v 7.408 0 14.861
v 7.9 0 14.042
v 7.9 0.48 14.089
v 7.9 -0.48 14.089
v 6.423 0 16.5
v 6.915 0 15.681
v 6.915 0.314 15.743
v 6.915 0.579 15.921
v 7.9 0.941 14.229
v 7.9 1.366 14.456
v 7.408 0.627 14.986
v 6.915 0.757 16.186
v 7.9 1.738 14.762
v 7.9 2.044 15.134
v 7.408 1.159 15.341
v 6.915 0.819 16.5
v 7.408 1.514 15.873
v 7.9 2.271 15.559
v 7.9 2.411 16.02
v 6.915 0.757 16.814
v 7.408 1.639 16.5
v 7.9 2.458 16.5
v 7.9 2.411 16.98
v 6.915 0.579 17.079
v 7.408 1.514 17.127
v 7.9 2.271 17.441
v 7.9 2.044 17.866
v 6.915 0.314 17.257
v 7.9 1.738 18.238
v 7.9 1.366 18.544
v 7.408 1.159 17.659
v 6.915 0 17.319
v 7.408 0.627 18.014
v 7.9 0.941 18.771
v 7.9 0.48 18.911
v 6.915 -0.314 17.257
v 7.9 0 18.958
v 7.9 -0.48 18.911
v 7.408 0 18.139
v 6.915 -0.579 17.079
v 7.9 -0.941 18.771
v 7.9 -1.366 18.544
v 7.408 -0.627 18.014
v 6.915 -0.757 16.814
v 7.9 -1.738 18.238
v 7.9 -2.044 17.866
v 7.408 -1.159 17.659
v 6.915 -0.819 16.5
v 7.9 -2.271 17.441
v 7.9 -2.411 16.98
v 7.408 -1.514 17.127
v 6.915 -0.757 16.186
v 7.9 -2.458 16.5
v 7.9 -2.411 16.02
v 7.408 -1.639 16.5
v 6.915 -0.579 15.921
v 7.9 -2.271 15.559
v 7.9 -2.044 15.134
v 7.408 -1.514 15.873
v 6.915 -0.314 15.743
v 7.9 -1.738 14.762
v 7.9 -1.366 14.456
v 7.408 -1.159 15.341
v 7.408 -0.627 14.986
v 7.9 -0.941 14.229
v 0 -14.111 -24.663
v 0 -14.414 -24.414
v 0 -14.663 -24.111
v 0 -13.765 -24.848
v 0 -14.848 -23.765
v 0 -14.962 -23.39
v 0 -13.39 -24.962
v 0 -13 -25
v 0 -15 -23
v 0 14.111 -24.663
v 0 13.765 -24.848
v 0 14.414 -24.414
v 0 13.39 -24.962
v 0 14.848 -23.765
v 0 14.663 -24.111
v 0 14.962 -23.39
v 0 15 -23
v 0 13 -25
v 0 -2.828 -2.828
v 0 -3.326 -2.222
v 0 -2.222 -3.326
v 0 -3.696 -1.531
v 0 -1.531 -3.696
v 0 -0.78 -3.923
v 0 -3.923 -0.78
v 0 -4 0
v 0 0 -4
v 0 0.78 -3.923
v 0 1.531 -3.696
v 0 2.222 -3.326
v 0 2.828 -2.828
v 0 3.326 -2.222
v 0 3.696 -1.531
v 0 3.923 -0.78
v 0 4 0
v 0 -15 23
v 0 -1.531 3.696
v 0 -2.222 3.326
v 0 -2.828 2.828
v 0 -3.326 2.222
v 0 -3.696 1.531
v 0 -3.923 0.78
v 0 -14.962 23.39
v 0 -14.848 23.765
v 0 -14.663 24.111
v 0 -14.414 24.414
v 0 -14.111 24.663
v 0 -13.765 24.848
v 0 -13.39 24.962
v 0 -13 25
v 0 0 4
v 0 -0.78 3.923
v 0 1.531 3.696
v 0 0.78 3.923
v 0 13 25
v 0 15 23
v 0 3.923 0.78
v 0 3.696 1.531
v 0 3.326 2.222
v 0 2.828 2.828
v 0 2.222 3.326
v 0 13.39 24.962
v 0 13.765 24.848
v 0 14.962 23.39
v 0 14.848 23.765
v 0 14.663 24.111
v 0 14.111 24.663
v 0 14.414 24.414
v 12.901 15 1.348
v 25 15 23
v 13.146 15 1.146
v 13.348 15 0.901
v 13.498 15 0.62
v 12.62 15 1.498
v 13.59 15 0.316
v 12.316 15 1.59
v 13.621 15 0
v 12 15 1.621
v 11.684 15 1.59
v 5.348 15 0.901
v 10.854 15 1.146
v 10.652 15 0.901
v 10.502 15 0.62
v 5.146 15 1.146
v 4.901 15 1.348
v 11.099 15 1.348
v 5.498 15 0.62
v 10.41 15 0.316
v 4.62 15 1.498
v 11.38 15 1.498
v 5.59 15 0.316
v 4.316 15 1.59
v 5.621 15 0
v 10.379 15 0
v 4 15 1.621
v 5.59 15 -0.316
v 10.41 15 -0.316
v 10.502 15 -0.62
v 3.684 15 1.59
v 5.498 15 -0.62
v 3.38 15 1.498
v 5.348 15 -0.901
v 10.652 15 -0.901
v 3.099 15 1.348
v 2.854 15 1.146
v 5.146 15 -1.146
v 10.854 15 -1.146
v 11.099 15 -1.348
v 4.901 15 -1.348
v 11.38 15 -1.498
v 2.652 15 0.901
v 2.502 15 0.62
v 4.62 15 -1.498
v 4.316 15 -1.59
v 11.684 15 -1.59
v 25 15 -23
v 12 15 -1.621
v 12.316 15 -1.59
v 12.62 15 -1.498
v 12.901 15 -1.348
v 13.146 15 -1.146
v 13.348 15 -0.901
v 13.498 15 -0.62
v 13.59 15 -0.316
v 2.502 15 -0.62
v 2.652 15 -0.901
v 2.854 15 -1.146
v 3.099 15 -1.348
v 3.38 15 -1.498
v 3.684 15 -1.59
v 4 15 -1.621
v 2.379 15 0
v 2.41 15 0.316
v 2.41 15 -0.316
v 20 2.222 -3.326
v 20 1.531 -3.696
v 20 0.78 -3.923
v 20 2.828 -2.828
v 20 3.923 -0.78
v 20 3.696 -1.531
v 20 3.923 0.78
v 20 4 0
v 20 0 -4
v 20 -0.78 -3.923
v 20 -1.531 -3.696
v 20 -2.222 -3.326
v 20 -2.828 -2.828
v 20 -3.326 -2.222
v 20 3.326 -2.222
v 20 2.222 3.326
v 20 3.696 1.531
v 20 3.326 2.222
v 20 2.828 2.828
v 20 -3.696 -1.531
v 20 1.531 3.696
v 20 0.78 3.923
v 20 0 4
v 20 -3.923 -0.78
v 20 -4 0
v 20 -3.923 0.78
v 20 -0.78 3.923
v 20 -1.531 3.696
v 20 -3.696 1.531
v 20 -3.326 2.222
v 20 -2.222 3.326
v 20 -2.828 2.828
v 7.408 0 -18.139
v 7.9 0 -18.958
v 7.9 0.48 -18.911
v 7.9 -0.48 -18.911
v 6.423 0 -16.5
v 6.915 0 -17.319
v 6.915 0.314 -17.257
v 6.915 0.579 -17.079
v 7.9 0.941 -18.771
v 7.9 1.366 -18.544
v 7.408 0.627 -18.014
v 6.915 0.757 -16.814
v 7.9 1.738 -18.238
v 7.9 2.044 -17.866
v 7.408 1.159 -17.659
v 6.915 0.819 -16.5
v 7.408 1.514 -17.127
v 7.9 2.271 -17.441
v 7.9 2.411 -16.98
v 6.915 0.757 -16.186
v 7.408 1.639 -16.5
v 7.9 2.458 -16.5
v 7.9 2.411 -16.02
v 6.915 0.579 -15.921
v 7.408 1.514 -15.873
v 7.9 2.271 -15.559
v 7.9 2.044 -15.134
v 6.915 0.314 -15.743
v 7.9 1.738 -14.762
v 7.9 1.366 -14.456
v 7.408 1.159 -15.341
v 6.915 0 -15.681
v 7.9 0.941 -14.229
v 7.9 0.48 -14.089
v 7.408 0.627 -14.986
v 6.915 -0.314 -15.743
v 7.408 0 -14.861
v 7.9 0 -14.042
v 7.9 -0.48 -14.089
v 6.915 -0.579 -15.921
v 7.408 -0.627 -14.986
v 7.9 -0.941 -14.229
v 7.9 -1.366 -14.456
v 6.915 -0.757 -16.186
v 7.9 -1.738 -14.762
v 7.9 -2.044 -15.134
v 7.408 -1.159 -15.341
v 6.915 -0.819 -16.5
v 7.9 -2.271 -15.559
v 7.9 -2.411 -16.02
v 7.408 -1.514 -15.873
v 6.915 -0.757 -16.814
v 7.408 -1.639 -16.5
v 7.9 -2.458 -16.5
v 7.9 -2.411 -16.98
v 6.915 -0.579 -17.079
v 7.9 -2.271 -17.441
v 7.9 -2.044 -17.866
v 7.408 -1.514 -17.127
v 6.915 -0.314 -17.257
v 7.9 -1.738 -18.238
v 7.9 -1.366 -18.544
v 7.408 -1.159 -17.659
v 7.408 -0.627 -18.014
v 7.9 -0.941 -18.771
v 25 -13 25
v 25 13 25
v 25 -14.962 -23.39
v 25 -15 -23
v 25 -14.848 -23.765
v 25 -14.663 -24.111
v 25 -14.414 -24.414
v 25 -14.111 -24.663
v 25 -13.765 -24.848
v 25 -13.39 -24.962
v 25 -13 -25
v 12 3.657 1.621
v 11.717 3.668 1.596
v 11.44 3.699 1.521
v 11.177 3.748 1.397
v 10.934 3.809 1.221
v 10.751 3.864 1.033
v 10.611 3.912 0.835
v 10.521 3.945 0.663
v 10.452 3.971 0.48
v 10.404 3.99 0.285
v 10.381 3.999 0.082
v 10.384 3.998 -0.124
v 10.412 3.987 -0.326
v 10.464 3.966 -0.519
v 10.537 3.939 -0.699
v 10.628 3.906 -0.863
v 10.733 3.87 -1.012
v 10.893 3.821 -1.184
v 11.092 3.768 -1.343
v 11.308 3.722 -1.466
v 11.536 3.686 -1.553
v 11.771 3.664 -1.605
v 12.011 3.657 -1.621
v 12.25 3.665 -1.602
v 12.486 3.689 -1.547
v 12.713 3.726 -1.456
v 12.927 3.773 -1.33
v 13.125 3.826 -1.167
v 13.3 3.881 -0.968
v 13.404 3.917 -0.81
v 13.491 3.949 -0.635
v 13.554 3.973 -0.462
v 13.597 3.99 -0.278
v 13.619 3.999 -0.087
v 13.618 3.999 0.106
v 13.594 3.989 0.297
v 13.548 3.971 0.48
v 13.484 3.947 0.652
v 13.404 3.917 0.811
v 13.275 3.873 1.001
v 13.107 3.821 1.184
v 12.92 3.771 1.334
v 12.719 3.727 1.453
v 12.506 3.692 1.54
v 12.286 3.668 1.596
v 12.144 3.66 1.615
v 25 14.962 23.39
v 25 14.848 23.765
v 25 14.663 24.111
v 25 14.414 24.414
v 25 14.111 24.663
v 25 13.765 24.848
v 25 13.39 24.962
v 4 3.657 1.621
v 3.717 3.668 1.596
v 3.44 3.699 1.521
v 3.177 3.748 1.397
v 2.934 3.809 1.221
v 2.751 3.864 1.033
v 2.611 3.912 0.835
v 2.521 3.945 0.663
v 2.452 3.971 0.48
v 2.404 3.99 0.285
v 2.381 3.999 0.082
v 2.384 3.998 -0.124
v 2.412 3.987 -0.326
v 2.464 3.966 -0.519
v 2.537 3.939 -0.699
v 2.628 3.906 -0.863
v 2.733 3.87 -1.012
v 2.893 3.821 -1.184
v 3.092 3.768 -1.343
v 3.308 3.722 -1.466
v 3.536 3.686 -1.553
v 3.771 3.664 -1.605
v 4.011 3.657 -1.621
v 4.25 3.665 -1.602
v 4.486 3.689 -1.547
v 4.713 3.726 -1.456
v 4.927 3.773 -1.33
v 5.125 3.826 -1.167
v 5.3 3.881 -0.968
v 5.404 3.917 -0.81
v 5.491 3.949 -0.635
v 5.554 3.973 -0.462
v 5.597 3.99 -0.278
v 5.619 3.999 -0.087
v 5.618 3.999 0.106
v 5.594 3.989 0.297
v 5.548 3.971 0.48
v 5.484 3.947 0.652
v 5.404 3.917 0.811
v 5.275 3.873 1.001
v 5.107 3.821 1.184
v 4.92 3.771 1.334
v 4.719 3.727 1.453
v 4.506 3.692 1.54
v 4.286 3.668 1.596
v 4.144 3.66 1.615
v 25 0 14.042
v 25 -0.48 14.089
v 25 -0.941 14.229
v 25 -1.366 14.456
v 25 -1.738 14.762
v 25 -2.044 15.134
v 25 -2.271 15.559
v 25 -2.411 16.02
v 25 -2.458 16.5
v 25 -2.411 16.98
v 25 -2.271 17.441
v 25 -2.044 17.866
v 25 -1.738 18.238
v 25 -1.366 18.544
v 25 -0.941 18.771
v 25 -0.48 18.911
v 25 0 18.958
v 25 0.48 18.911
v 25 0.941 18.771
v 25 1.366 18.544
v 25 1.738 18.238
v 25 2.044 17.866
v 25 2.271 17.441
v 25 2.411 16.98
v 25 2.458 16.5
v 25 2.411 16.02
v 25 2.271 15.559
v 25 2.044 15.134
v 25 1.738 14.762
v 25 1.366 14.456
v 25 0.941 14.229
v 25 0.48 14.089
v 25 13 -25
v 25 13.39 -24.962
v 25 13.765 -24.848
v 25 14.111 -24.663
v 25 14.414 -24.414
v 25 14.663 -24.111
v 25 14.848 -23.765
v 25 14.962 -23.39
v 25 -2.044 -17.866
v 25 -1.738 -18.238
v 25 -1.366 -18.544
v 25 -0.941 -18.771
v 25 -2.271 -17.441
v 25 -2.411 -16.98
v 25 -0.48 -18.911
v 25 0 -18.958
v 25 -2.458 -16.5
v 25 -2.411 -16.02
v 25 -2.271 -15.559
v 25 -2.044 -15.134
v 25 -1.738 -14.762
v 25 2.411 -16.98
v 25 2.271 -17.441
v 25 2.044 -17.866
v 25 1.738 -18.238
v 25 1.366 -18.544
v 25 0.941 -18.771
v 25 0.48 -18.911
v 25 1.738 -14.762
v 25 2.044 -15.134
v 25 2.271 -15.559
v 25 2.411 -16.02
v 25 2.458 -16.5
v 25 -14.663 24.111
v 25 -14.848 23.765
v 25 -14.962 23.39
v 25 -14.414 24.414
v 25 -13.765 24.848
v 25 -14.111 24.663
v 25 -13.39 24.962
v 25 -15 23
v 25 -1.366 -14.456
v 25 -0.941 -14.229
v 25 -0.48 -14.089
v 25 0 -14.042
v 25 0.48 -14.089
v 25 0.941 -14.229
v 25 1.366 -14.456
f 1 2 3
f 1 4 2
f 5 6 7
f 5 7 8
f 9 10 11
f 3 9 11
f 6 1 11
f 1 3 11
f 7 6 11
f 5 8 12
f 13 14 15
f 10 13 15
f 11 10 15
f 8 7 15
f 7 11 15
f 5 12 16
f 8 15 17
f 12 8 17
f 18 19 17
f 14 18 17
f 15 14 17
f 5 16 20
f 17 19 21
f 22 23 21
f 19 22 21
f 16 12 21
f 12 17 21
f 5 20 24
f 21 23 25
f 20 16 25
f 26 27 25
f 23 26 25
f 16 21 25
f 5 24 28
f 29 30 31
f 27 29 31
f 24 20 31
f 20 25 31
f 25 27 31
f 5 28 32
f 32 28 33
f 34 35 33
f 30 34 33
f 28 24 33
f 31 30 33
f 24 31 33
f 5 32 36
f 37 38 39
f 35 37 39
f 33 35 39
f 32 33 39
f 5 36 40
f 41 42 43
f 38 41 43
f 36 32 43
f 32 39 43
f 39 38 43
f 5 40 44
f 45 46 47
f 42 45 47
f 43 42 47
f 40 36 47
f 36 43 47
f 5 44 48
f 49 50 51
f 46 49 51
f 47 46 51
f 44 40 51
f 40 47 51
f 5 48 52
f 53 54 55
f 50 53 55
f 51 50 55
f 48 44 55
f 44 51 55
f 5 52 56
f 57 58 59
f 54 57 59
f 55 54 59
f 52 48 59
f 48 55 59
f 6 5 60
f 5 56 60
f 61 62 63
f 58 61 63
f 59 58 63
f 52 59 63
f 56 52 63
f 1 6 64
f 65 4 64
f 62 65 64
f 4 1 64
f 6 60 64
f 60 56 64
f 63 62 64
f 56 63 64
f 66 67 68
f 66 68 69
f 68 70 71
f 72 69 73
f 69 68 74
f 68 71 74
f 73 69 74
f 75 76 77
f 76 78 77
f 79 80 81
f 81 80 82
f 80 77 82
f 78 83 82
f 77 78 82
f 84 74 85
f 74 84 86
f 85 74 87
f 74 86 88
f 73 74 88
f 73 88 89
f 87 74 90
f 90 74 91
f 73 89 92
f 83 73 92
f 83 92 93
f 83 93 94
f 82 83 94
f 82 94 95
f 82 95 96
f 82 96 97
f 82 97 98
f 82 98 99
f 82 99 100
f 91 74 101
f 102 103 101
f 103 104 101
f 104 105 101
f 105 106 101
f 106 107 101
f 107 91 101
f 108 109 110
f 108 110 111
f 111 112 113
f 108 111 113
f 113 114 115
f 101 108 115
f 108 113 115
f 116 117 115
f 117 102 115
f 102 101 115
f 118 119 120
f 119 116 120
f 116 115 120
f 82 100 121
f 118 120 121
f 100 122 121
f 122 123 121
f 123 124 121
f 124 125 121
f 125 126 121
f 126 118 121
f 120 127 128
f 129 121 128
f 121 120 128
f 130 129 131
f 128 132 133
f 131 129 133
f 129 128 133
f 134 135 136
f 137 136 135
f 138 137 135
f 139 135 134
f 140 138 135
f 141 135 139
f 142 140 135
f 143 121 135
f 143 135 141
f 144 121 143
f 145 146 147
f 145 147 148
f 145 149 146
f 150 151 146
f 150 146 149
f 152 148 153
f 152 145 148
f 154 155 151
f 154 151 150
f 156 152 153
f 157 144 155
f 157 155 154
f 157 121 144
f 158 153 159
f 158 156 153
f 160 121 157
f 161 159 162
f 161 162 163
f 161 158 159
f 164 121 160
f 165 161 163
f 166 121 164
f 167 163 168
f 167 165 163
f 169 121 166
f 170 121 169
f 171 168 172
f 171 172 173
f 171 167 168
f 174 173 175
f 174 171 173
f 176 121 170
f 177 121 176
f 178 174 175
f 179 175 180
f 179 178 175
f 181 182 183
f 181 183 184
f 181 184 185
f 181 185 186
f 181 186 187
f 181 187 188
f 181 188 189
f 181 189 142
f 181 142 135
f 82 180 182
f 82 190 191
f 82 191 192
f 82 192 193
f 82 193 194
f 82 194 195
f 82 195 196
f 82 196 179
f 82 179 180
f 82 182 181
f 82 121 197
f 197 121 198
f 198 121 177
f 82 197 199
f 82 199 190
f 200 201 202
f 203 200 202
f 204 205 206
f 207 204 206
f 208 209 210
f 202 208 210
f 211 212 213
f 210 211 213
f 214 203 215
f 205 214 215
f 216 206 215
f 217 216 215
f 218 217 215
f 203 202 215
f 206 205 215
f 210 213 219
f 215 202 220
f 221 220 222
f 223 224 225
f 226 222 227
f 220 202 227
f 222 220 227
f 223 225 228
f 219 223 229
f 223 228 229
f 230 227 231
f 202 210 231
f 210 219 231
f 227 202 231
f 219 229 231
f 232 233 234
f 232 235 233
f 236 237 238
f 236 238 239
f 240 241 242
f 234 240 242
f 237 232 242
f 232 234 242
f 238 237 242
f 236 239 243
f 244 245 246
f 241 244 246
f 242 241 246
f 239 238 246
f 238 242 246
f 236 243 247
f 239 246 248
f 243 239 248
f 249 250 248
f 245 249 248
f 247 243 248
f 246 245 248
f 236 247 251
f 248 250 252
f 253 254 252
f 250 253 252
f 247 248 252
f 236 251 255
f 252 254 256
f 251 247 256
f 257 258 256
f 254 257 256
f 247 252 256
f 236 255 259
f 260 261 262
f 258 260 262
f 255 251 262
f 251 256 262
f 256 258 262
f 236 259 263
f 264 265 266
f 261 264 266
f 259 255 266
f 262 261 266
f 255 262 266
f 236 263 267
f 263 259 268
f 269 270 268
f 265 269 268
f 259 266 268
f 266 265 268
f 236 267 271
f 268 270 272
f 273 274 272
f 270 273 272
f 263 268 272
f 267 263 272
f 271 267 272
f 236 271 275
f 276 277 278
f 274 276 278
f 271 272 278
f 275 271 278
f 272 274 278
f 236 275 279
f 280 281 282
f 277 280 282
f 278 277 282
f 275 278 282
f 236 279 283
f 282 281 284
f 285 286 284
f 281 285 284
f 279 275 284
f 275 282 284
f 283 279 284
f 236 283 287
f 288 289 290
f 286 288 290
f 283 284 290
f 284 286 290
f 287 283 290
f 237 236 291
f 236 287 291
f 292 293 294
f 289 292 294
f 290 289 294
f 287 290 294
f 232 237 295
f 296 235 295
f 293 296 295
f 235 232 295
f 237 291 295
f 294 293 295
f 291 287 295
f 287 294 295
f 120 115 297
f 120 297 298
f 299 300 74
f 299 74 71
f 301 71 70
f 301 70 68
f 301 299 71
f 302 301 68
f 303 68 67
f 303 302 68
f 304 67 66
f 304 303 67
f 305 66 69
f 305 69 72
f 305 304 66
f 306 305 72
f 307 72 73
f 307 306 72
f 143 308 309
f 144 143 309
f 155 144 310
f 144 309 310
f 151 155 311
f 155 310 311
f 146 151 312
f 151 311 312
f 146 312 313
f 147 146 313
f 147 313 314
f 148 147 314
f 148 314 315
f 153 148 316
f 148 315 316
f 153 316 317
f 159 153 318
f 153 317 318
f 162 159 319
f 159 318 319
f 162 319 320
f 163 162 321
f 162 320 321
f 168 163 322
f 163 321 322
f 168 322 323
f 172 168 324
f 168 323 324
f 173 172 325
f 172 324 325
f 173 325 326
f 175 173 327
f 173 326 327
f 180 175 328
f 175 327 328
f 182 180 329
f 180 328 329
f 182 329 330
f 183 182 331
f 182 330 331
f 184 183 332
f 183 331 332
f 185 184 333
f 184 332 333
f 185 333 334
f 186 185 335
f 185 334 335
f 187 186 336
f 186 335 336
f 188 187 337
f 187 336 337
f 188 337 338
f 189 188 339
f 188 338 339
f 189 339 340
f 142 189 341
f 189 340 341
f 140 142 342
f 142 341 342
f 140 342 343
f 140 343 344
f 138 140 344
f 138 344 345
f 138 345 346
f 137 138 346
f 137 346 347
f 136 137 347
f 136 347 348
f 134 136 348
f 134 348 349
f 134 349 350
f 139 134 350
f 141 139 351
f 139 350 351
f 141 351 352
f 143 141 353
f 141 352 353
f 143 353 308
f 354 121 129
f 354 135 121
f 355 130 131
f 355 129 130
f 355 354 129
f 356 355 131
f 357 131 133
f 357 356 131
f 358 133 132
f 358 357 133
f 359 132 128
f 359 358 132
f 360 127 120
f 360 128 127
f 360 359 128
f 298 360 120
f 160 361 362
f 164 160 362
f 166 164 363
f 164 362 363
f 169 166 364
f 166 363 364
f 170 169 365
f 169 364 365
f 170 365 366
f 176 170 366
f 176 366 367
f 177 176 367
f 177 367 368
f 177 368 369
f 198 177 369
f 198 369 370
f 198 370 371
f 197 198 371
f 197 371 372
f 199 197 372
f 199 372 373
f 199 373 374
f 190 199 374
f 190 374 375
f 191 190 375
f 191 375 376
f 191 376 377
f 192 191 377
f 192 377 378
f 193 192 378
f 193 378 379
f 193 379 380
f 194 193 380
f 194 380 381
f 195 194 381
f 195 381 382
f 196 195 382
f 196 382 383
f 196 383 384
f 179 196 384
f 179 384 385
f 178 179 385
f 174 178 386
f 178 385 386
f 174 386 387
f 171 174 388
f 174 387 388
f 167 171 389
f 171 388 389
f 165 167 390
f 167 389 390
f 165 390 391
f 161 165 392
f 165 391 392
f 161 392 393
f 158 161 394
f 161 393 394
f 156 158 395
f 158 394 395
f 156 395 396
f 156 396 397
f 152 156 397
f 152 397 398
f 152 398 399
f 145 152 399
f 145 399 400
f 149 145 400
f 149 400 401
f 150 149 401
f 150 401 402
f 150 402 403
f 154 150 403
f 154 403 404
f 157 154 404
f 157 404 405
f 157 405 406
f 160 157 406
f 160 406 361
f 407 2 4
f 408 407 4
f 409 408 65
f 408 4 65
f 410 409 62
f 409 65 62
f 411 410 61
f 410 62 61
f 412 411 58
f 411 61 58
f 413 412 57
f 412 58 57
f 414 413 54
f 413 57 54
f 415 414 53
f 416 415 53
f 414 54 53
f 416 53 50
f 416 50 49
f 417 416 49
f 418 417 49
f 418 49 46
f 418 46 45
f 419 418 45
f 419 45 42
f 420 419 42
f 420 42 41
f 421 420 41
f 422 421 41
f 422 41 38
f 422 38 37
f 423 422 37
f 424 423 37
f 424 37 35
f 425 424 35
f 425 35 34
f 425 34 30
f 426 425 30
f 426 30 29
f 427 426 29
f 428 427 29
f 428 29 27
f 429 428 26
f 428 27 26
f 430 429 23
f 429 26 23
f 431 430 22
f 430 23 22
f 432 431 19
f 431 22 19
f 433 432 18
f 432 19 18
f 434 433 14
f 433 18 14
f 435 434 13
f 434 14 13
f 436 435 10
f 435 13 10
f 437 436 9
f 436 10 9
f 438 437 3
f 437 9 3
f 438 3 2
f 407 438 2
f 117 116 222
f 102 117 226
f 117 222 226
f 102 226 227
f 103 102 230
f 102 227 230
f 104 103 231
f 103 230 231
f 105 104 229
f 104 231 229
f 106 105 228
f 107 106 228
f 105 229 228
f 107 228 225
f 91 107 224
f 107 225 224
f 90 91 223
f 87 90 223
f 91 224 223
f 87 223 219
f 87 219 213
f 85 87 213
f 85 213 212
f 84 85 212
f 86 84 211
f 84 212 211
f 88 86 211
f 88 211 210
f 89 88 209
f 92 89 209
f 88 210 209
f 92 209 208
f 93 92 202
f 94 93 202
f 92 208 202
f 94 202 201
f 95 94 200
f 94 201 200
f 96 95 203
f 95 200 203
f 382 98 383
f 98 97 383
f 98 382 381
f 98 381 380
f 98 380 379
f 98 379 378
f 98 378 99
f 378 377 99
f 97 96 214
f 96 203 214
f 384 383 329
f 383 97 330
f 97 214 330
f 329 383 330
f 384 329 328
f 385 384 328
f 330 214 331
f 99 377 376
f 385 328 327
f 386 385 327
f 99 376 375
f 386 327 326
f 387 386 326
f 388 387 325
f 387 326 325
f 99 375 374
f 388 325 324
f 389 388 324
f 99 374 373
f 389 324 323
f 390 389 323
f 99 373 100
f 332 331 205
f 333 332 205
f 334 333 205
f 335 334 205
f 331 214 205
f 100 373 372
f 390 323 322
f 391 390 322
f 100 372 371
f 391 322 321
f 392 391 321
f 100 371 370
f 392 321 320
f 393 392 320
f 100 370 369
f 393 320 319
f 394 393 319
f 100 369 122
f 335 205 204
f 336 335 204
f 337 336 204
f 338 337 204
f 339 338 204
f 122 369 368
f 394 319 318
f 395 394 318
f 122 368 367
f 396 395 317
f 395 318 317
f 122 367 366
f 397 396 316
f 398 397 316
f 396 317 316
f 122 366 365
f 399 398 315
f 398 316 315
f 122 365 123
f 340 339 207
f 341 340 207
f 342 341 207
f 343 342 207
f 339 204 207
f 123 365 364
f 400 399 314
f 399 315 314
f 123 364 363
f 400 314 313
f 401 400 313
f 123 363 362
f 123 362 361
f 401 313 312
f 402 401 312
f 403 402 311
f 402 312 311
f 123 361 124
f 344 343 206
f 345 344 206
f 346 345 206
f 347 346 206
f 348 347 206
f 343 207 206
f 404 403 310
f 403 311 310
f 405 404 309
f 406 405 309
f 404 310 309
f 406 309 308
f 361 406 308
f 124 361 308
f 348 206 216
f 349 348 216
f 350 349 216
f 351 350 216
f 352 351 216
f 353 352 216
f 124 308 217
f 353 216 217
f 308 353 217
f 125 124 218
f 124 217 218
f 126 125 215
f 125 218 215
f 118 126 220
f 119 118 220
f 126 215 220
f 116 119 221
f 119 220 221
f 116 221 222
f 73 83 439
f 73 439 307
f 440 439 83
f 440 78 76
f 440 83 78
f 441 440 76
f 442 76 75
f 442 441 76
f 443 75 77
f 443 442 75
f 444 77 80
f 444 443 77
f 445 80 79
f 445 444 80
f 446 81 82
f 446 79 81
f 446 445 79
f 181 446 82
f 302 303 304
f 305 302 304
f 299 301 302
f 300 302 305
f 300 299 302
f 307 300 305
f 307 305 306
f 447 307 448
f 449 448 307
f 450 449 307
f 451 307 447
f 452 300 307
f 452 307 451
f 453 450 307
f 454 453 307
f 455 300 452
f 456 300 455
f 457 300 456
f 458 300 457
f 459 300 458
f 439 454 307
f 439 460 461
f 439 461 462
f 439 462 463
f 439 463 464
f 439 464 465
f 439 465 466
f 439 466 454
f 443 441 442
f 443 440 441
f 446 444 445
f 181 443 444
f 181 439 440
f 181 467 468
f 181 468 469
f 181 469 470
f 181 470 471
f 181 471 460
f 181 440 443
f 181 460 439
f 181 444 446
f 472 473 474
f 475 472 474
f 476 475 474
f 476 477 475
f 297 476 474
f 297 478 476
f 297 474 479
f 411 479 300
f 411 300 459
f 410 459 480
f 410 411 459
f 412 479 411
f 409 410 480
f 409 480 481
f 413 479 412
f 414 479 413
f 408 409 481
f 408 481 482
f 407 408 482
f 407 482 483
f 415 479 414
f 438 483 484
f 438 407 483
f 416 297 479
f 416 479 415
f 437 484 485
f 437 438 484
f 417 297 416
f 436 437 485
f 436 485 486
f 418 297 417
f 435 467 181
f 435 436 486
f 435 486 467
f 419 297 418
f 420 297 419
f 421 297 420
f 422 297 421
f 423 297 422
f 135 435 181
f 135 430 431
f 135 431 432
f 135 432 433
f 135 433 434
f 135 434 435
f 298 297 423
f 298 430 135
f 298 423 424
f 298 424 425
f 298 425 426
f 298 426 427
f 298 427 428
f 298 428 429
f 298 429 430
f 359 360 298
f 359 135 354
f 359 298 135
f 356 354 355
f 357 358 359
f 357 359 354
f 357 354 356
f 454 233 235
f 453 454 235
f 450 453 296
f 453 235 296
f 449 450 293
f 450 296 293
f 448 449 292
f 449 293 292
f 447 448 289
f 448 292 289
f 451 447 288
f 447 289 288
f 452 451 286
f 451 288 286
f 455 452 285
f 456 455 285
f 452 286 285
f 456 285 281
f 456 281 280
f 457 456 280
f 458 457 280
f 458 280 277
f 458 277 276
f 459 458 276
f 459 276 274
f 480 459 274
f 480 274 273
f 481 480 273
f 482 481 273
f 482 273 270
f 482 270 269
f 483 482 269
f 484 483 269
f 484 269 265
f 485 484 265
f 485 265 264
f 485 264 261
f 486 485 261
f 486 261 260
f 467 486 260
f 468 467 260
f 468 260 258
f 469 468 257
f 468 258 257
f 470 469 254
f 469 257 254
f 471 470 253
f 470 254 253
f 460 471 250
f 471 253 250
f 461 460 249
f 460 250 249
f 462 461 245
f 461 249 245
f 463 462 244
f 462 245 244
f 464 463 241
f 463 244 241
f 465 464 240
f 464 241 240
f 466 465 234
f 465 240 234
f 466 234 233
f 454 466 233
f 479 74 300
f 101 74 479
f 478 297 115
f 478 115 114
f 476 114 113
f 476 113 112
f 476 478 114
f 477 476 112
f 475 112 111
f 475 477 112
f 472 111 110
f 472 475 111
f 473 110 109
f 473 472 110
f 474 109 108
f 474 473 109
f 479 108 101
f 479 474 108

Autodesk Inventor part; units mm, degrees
ref_plane "YZ Plane" through (0, 0, 0) normal (1, 0, 0) x (0, 1, 0)
ref_plane "XZ Plane" through (0, 0, 0) normal (0, 1, 0) x (-1, 0, 0)
ref_plane "XY Plane" through (0, 0, 0) normal (0, 0, 1) x (1, 0, 0)
sketch "Sketch1" plane through (0, 0, 0) normal (1, 0, 0) x (0, 1, 0)
  line L0 (-15, 25) -> (15, 25)
  line L1 (15, 25) -> (15, -25)
  line L2 (15, -25) -> (-15, -25)
  line L3 (-15, -25) -> (-15, 25)
  line L4 (-15, 25) -> (15, -25) construction
  line L5 (15, 25) -> (-15, -25) construction
  point P0 (0, 0)
  dimension "d1" = 50
  dimension "d2" = 30
extrude "Extrusion1" add sketch "Sketch1" along normal blind 25
hole "Hole1" at (0, 0, 0) direction (1, 0, 0) diameter 8 depth 20
sketch "Sketch2" plane through (0, 15, 25) normal (0, 1, 0) x (1, 0, 0)
  line L0 (0, 25) -> (25, 25) construction
  line L1 (25, 50) -> (25, 0) construction
  line L2 (0, 50) -> (0, 0) construction
  point P0 (4, 25)
  point P1 (12, 25)
  dimension "d12" = 4
  dimension "d13" = 12
hole "Hole2" at (4, 15, 0) at (12, 15, 0) direction (0, -1, 0) diameter 3.242 end up to surface thread size "M4x0.7" class "6H" standard "ISO Metric profile"
sketch "Sketch3" plane through (25, 0, 0) normal (1, 0, 0) x (0, 0, -1)
  line L0 (-16.5, 0) -> (0, 0) construction
  line L1 (0, 0) -> (16.5, 0) construction
  dimension "d21" = 33
hole "Hole3" at (25, 0, 16.5) at (25, 0, -16.5) direction (-1, 0, 0) diameter 4.917 depth 17.1 tip angle 118 thread size "M6x1" class "6H" standard "ISO Metric profile"
fillet "Fillet1" radius 2 4 edges at (12.5, 15, -25) (12.5, -15, -25) (12.5, -15, 25) (12.5, 15, 25)
properties part number "axle_tube_mount_8mm" material "Steel, Alloy"
